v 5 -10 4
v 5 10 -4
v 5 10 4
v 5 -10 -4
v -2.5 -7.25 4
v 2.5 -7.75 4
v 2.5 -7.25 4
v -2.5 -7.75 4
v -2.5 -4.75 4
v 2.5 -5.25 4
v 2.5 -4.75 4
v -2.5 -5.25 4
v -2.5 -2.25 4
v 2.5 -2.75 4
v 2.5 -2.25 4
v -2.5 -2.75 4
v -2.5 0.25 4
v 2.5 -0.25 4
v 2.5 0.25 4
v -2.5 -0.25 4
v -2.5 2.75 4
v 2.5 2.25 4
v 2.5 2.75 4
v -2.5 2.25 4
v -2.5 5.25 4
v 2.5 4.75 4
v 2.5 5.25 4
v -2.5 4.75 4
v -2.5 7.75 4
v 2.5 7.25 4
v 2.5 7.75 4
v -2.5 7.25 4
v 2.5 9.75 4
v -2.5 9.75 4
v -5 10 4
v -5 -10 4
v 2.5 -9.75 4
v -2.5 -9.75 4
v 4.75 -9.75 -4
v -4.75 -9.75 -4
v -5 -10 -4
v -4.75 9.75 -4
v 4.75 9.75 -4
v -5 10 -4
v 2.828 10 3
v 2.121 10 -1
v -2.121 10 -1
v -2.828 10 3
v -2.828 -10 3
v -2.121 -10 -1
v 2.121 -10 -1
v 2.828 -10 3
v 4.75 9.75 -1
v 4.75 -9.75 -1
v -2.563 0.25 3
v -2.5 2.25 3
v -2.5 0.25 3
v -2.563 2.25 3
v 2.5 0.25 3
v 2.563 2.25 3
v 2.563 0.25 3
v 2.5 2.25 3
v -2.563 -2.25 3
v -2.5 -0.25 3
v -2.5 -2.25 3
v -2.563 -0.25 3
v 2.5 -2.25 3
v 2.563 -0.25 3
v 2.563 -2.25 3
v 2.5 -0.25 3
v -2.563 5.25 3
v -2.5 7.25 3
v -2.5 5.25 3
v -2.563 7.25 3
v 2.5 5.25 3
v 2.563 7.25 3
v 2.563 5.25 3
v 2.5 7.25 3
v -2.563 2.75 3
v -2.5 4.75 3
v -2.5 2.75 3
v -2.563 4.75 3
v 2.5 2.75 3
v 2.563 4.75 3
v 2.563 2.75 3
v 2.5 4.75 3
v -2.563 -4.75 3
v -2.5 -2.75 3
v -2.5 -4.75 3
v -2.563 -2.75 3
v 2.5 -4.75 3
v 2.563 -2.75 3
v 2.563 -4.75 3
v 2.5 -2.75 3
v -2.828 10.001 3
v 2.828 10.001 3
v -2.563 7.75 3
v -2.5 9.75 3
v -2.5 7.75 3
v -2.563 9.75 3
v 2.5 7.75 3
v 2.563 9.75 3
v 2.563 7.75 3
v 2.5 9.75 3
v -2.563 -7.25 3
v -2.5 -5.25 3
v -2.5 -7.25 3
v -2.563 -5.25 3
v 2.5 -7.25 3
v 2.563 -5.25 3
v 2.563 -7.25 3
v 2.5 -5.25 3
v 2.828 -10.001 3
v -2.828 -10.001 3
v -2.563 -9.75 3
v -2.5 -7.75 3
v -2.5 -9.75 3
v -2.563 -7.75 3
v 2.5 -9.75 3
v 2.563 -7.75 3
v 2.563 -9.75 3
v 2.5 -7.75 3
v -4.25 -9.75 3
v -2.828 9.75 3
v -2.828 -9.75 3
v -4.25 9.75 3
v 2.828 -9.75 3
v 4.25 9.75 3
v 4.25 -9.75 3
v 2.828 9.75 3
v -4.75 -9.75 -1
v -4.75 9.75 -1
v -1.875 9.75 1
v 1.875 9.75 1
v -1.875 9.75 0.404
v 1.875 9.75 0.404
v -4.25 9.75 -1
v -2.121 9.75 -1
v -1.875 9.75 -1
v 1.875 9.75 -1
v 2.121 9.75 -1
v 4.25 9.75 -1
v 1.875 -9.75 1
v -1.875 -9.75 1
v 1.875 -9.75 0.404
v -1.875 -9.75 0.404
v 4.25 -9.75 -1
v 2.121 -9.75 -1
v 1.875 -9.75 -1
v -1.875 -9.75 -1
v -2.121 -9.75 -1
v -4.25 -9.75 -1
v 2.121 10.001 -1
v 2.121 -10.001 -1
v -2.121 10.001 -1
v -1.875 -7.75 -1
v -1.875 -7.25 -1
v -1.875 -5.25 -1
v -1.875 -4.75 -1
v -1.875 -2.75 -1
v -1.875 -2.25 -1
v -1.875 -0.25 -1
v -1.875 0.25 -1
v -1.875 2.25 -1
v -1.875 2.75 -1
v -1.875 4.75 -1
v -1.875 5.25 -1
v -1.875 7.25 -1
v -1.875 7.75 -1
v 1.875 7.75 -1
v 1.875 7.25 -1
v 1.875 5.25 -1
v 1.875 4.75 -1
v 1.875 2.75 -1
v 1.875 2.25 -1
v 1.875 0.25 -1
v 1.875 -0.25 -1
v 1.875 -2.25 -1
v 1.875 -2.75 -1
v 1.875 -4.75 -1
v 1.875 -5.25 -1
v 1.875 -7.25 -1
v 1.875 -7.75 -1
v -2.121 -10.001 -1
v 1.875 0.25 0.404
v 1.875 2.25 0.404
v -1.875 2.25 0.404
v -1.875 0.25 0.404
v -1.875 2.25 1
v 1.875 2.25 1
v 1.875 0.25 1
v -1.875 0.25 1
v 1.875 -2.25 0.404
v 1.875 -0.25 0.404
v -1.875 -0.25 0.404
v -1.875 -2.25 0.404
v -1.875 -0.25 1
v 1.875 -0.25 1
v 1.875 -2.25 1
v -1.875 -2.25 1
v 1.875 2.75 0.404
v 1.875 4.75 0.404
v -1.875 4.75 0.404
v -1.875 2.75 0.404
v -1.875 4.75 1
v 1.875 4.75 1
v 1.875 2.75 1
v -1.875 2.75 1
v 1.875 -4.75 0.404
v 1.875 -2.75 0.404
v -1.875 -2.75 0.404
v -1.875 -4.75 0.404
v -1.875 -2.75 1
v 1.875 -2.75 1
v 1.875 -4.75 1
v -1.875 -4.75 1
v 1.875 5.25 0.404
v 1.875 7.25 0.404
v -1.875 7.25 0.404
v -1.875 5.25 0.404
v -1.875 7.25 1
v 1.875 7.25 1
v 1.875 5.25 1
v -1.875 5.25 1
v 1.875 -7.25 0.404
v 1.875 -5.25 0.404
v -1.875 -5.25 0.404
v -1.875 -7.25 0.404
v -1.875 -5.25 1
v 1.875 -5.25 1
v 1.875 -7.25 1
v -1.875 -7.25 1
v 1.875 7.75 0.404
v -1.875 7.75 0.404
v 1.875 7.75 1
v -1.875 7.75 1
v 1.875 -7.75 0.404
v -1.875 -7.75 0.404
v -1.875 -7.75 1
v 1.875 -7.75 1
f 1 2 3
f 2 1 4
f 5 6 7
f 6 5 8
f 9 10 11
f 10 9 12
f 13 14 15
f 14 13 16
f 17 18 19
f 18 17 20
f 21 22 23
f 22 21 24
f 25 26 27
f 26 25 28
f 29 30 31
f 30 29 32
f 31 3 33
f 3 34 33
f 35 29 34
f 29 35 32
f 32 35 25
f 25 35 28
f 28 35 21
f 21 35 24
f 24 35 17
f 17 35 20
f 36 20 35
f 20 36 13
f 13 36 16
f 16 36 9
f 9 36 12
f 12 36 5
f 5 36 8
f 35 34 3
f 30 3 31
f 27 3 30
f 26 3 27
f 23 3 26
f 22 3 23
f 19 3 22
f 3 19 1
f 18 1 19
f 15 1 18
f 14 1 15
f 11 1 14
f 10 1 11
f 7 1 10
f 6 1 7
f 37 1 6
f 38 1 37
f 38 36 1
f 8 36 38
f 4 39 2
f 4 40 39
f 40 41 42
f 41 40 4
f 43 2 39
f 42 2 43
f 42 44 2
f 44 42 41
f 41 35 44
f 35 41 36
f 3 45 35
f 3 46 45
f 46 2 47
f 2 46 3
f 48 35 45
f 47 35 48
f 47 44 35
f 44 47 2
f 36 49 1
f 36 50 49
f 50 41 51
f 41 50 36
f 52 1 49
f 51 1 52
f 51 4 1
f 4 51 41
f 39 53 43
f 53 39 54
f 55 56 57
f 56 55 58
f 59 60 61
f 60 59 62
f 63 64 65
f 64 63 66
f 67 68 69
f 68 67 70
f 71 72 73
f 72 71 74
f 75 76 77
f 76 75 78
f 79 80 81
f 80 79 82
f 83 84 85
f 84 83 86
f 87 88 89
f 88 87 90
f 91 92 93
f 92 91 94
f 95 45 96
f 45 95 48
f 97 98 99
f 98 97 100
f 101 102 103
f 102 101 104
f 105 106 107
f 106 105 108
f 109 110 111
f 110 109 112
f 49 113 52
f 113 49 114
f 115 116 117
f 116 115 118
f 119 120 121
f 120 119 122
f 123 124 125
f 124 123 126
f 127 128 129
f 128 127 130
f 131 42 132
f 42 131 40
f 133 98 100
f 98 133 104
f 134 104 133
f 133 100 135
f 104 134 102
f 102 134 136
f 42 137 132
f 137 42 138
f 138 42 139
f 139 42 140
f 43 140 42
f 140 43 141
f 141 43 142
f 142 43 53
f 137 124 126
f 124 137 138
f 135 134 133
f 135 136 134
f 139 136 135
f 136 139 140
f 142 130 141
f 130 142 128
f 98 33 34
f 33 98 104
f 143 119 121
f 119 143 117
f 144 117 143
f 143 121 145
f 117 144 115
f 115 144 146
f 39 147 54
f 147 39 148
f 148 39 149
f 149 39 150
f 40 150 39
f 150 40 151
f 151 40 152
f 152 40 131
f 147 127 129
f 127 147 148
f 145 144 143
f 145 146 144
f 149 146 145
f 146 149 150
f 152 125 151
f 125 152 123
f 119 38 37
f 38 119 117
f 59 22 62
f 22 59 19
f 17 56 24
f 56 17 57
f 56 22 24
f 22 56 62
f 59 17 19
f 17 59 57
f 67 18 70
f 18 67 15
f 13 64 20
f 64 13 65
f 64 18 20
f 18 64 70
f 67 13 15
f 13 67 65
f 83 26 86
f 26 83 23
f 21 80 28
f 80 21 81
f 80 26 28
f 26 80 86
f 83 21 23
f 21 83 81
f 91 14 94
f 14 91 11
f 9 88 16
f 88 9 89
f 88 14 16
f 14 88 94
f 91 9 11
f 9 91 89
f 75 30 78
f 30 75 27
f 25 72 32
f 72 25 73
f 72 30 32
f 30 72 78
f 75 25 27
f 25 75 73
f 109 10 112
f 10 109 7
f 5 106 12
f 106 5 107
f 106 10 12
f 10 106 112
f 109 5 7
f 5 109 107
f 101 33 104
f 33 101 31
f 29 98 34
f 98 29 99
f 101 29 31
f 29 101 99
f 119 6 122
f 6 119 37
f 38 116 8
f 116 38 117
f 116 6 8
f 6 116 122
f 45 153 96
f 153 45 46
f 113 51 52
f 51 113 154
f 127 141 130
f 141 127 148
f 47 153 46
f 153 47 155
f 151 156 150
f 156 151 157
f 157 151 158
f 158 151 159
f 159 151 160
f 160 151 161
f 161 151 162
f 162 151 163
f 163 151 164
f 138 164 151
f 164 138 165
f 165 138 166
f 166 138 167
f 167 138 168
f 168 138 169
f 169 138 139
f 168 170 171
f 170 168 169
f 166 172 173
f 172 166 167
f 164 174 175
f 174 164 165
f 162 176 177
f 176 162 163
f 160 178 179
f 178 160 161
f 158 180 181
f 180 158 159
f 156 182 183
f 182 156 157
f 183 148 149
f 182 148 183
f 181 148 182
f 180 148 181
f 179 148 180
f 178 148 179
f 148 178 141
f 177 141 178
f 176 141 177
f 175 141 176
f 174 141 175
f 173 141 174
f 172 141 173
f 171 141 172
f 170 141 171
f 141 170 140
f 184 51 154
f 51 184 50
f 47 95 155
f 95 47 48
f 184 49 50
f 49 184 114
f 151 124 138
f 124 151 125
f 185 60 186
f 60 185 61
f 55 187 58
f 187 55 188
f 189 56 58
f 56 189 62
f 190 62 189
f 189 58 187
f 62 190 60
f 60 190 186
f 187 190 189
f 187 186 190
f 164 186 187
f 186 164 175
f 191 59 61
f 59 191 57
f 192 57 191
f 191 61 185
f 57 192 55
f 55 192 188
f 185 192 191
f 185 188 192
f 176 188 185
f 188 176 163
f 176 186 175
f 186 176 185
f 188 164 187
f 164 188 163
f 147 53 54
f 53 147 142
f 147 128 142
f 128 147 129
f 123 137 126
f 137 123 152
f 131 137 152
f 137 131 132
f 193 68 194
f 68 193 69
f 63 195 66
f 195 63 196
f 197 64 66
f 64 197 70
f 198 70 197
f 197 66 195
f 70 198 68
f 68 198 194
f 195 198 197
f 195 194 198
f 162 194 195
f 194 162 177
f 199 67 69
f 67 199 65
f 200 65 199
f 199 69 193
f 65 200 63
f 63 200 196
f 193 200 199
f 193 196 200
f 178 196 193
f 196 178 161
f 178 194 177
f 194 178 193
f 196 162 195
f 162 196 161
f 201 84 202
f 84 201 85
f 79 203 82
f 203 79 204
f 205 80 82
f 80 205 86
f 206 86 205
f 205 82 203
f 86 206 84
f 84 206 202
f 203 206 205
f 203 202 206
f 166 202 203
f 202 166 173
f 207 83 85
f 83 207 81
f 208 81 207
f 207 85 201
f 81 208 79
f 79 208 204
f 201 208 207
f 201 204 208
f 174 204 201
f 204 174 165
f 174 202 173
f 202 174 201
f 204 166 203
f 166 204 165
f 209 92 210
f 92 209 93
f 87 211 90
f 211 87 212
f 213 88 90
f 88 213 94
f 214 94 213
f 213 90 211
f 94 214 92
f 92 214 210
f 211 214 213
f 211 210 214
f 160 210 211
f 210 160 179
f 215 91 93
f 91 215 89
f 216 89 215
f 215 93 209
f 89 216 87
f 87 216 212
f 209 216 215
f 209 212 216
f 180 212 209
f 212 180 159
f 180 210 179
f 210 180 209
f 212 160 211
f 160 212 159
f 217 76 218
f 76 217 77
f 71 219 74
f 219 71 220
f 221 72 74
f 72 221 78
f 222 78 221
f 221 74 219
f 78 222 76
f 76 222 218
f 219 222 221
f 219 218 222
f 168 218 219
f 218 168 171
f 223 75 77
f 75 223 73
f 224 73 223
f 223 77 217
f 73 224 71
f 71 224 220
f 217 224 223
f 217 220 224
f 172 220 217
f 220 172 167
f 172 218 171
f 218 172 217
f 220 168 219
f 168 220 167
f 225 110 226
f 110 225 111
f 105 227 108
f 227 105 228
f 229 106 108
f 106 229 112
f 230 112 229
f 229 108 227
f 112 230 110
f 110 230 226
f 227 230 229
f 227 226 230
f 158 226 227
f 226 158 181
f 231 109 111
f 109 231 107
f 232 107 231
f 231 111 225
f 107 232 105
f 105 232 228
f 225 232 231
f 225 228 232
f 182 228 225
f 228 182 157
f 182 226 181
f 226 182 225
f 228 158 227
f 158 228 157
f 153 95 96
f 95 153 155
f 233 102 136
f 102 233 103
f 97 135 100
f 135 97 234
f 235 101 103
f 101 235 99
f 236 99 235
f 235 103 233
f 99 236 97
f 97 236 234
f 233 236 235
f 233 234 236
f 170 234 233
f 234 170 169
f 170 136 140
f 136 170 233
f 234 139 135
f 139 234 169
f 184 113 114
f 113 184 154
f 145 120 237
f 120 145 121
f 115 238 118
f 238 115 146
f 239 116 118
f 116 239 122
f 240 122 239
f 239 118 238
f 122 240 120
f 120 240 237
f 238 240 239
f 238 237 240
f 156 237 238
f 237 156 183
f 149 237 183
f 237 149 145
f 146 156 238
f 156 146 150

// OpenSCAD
$fn=50;
$t=true;        //Abbreviation
$wth=.5;        //Wall Thickness
$l=20;          //Length
$w=10;          //Width
$h=8;           //Height
$ow=5;          //LED Opening Width
$oiw=3.5;       //LED Opening Inside Width
$ol=2;          //LED Opening length
$os=.5;         //LED Opening Spacing
$ols=$ol+$os;   //Distance per LED
$olso=$ols/2;   //Offset for Center
$od=4;          //LED Opening Depth

module ledopening() {
    cube([$ow,$ol,$wth*4], center=$t);
}

module ledconduit() {
    difference() {
        difference() {
            rotate([0,0,45]) cylinder($h/2, $oiw-.5, $ow-1, $fn=4, center=$t);
            translate([0,3.751,0]) cube([$ow*2,$ow,$ow], center=$t);
            translate([0,-3.751,0]) cube([$ow*2,$ow,$ow], center=$t);
        }
        difference() {
            rotate([0,0,45]) translate([0,0,1]) cylinder($h/2, $oiw-1, $ow-1, $fn=4, center=$t);
            translate([0,3.5,1]) cube([$ow*2,$ow,$ow], center=$t);
            translate([0,-3.5,.51]) cube([$ow*2,$ow,$ow], center=$t);
        }
        translate([0,0,-1]) cube([$ow-$olso,$ol,$h/4], center=$t);
    }
    translate([4.5,0,0]) cube([.5,2.5,4], center=$t);
    translate([-4.5,0,0]) cube([.5,2.5,4], center=$t);
}

difference() {
    cube([$w,$l,$h], center=$t);
    translate([0,0,-$wth*2]) cube([$w-$wth,$l-$wth,$h], center=$t);
    translate([0,$olso,$h/2]) ledopening();         //LED #4
    translate([0,-$olso,$h/2]) ledopening();        //LED #5
    translate([0,$olso+$ols,$h/2]) ledopening();    //LED #3
    translate([0,-$olso-$ols,$h/2]) ledopening();   //LED #6
    translate([0,$olso+$ols*2,$h/2]) ledopening();  //LED #2
    translate([0,-$olso-$ols*2,$h/2]) ledopening(); //LED #7
    translate([0,$olso+$ols*3,$h/2]) ledopening();  //LED #1
    translate([0,-$olso-$ols*3,$h/2]) ledopening(); //LED #8
}
//translate([0,$olso,$h]) ledconduit();
translate([0,$olso,1]) ledconduit();                //LED Conduit #4
translate([0,-$olso,1]) ledconduit();               //LED Conduit #5
translate([0,$olso+$ols,1]) ledconduit();           //LED Conduit #3
translate([0,-$olso-$ols,1]) ledconduit();          //LED Conduit #6
translate([0,$olso+$ols*2,1]) ledconduit();         //LED Conduit #2
translate([0,-$olso-$ols*2,1]) ledconduit();        //LED Conduit #7
translate([0,$olso+$ols*3,1]) ledconduit();         //LED Conduit #1
translate([0,-$olso-$ols*3,1]) ledconduit();        //LED Conduit #8
